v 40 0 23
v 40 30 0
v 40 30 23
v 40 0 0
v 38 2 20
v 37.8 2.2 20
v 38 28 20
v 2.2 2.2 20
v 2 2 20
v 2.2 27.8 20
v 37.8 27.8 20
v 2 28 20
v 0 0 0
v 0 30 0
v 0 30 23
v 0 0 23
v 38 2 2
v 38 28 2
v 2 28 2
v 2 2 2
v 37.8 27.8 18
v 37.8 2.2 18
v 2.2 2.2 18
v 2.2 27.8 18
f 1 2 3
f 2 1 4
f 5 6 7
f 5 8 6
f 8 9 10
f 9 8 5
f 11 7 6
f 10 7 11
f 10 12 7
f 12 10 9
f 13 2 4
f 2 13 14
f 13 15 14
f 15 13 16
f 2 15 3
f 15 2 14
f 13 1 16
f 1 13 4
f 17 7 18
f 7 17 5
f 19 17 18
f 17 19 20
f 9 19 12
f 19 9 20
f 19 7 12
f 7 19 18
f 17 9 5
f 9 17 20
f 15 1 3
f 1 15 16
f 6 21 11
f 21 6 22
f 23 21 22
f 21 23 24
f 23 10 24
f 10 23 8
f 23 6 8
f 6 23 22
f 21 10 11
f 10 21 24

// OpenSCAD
// Example model for openscad.mk: a small box with a press-fit lid.
// Every printed part is modelled in print orientation, sitting on z = 0.

part = "assembly"; // box | lid | assembly
cut = false;       // slice the assembly open to show the fit

size = [40, 30, 20];
wall = 2;
lid_h = 3;
lip = 2;
fit = 0.2; // clearance between the lid's lip and the box

module box() {
    difference() {
        cube(size);
        translate([wall, wall, wall])
            cube([size.x - 2 * wall, size.y - 2 * wall, size.z]);
    }
}

// Printed upside down: the flat top is on the bed and the lip points up.
module lid() {
    cube([size.x, size.y, lid_h]);
    translate([wall + fit, wall + fit, lid_h])
        cube([size.x - 2 * (wall + fit), size.y - 2 * (wall + fit), lip]);
}

module assembly() {
    color("SteelBlue") box();
    color("Orange")
        translate([0, size.y, size.z + lid_h])
            rotate([180, 0, 0])
                lid();
}

if (part == "box") box();
else if (part == "lid") lid();
else difference() {
    assembly();
    if (cut) translate([-1, -1, -1]) cube([size.x + 2, size.y / 2 + 1, size.z + lid_h + 2]);
}
